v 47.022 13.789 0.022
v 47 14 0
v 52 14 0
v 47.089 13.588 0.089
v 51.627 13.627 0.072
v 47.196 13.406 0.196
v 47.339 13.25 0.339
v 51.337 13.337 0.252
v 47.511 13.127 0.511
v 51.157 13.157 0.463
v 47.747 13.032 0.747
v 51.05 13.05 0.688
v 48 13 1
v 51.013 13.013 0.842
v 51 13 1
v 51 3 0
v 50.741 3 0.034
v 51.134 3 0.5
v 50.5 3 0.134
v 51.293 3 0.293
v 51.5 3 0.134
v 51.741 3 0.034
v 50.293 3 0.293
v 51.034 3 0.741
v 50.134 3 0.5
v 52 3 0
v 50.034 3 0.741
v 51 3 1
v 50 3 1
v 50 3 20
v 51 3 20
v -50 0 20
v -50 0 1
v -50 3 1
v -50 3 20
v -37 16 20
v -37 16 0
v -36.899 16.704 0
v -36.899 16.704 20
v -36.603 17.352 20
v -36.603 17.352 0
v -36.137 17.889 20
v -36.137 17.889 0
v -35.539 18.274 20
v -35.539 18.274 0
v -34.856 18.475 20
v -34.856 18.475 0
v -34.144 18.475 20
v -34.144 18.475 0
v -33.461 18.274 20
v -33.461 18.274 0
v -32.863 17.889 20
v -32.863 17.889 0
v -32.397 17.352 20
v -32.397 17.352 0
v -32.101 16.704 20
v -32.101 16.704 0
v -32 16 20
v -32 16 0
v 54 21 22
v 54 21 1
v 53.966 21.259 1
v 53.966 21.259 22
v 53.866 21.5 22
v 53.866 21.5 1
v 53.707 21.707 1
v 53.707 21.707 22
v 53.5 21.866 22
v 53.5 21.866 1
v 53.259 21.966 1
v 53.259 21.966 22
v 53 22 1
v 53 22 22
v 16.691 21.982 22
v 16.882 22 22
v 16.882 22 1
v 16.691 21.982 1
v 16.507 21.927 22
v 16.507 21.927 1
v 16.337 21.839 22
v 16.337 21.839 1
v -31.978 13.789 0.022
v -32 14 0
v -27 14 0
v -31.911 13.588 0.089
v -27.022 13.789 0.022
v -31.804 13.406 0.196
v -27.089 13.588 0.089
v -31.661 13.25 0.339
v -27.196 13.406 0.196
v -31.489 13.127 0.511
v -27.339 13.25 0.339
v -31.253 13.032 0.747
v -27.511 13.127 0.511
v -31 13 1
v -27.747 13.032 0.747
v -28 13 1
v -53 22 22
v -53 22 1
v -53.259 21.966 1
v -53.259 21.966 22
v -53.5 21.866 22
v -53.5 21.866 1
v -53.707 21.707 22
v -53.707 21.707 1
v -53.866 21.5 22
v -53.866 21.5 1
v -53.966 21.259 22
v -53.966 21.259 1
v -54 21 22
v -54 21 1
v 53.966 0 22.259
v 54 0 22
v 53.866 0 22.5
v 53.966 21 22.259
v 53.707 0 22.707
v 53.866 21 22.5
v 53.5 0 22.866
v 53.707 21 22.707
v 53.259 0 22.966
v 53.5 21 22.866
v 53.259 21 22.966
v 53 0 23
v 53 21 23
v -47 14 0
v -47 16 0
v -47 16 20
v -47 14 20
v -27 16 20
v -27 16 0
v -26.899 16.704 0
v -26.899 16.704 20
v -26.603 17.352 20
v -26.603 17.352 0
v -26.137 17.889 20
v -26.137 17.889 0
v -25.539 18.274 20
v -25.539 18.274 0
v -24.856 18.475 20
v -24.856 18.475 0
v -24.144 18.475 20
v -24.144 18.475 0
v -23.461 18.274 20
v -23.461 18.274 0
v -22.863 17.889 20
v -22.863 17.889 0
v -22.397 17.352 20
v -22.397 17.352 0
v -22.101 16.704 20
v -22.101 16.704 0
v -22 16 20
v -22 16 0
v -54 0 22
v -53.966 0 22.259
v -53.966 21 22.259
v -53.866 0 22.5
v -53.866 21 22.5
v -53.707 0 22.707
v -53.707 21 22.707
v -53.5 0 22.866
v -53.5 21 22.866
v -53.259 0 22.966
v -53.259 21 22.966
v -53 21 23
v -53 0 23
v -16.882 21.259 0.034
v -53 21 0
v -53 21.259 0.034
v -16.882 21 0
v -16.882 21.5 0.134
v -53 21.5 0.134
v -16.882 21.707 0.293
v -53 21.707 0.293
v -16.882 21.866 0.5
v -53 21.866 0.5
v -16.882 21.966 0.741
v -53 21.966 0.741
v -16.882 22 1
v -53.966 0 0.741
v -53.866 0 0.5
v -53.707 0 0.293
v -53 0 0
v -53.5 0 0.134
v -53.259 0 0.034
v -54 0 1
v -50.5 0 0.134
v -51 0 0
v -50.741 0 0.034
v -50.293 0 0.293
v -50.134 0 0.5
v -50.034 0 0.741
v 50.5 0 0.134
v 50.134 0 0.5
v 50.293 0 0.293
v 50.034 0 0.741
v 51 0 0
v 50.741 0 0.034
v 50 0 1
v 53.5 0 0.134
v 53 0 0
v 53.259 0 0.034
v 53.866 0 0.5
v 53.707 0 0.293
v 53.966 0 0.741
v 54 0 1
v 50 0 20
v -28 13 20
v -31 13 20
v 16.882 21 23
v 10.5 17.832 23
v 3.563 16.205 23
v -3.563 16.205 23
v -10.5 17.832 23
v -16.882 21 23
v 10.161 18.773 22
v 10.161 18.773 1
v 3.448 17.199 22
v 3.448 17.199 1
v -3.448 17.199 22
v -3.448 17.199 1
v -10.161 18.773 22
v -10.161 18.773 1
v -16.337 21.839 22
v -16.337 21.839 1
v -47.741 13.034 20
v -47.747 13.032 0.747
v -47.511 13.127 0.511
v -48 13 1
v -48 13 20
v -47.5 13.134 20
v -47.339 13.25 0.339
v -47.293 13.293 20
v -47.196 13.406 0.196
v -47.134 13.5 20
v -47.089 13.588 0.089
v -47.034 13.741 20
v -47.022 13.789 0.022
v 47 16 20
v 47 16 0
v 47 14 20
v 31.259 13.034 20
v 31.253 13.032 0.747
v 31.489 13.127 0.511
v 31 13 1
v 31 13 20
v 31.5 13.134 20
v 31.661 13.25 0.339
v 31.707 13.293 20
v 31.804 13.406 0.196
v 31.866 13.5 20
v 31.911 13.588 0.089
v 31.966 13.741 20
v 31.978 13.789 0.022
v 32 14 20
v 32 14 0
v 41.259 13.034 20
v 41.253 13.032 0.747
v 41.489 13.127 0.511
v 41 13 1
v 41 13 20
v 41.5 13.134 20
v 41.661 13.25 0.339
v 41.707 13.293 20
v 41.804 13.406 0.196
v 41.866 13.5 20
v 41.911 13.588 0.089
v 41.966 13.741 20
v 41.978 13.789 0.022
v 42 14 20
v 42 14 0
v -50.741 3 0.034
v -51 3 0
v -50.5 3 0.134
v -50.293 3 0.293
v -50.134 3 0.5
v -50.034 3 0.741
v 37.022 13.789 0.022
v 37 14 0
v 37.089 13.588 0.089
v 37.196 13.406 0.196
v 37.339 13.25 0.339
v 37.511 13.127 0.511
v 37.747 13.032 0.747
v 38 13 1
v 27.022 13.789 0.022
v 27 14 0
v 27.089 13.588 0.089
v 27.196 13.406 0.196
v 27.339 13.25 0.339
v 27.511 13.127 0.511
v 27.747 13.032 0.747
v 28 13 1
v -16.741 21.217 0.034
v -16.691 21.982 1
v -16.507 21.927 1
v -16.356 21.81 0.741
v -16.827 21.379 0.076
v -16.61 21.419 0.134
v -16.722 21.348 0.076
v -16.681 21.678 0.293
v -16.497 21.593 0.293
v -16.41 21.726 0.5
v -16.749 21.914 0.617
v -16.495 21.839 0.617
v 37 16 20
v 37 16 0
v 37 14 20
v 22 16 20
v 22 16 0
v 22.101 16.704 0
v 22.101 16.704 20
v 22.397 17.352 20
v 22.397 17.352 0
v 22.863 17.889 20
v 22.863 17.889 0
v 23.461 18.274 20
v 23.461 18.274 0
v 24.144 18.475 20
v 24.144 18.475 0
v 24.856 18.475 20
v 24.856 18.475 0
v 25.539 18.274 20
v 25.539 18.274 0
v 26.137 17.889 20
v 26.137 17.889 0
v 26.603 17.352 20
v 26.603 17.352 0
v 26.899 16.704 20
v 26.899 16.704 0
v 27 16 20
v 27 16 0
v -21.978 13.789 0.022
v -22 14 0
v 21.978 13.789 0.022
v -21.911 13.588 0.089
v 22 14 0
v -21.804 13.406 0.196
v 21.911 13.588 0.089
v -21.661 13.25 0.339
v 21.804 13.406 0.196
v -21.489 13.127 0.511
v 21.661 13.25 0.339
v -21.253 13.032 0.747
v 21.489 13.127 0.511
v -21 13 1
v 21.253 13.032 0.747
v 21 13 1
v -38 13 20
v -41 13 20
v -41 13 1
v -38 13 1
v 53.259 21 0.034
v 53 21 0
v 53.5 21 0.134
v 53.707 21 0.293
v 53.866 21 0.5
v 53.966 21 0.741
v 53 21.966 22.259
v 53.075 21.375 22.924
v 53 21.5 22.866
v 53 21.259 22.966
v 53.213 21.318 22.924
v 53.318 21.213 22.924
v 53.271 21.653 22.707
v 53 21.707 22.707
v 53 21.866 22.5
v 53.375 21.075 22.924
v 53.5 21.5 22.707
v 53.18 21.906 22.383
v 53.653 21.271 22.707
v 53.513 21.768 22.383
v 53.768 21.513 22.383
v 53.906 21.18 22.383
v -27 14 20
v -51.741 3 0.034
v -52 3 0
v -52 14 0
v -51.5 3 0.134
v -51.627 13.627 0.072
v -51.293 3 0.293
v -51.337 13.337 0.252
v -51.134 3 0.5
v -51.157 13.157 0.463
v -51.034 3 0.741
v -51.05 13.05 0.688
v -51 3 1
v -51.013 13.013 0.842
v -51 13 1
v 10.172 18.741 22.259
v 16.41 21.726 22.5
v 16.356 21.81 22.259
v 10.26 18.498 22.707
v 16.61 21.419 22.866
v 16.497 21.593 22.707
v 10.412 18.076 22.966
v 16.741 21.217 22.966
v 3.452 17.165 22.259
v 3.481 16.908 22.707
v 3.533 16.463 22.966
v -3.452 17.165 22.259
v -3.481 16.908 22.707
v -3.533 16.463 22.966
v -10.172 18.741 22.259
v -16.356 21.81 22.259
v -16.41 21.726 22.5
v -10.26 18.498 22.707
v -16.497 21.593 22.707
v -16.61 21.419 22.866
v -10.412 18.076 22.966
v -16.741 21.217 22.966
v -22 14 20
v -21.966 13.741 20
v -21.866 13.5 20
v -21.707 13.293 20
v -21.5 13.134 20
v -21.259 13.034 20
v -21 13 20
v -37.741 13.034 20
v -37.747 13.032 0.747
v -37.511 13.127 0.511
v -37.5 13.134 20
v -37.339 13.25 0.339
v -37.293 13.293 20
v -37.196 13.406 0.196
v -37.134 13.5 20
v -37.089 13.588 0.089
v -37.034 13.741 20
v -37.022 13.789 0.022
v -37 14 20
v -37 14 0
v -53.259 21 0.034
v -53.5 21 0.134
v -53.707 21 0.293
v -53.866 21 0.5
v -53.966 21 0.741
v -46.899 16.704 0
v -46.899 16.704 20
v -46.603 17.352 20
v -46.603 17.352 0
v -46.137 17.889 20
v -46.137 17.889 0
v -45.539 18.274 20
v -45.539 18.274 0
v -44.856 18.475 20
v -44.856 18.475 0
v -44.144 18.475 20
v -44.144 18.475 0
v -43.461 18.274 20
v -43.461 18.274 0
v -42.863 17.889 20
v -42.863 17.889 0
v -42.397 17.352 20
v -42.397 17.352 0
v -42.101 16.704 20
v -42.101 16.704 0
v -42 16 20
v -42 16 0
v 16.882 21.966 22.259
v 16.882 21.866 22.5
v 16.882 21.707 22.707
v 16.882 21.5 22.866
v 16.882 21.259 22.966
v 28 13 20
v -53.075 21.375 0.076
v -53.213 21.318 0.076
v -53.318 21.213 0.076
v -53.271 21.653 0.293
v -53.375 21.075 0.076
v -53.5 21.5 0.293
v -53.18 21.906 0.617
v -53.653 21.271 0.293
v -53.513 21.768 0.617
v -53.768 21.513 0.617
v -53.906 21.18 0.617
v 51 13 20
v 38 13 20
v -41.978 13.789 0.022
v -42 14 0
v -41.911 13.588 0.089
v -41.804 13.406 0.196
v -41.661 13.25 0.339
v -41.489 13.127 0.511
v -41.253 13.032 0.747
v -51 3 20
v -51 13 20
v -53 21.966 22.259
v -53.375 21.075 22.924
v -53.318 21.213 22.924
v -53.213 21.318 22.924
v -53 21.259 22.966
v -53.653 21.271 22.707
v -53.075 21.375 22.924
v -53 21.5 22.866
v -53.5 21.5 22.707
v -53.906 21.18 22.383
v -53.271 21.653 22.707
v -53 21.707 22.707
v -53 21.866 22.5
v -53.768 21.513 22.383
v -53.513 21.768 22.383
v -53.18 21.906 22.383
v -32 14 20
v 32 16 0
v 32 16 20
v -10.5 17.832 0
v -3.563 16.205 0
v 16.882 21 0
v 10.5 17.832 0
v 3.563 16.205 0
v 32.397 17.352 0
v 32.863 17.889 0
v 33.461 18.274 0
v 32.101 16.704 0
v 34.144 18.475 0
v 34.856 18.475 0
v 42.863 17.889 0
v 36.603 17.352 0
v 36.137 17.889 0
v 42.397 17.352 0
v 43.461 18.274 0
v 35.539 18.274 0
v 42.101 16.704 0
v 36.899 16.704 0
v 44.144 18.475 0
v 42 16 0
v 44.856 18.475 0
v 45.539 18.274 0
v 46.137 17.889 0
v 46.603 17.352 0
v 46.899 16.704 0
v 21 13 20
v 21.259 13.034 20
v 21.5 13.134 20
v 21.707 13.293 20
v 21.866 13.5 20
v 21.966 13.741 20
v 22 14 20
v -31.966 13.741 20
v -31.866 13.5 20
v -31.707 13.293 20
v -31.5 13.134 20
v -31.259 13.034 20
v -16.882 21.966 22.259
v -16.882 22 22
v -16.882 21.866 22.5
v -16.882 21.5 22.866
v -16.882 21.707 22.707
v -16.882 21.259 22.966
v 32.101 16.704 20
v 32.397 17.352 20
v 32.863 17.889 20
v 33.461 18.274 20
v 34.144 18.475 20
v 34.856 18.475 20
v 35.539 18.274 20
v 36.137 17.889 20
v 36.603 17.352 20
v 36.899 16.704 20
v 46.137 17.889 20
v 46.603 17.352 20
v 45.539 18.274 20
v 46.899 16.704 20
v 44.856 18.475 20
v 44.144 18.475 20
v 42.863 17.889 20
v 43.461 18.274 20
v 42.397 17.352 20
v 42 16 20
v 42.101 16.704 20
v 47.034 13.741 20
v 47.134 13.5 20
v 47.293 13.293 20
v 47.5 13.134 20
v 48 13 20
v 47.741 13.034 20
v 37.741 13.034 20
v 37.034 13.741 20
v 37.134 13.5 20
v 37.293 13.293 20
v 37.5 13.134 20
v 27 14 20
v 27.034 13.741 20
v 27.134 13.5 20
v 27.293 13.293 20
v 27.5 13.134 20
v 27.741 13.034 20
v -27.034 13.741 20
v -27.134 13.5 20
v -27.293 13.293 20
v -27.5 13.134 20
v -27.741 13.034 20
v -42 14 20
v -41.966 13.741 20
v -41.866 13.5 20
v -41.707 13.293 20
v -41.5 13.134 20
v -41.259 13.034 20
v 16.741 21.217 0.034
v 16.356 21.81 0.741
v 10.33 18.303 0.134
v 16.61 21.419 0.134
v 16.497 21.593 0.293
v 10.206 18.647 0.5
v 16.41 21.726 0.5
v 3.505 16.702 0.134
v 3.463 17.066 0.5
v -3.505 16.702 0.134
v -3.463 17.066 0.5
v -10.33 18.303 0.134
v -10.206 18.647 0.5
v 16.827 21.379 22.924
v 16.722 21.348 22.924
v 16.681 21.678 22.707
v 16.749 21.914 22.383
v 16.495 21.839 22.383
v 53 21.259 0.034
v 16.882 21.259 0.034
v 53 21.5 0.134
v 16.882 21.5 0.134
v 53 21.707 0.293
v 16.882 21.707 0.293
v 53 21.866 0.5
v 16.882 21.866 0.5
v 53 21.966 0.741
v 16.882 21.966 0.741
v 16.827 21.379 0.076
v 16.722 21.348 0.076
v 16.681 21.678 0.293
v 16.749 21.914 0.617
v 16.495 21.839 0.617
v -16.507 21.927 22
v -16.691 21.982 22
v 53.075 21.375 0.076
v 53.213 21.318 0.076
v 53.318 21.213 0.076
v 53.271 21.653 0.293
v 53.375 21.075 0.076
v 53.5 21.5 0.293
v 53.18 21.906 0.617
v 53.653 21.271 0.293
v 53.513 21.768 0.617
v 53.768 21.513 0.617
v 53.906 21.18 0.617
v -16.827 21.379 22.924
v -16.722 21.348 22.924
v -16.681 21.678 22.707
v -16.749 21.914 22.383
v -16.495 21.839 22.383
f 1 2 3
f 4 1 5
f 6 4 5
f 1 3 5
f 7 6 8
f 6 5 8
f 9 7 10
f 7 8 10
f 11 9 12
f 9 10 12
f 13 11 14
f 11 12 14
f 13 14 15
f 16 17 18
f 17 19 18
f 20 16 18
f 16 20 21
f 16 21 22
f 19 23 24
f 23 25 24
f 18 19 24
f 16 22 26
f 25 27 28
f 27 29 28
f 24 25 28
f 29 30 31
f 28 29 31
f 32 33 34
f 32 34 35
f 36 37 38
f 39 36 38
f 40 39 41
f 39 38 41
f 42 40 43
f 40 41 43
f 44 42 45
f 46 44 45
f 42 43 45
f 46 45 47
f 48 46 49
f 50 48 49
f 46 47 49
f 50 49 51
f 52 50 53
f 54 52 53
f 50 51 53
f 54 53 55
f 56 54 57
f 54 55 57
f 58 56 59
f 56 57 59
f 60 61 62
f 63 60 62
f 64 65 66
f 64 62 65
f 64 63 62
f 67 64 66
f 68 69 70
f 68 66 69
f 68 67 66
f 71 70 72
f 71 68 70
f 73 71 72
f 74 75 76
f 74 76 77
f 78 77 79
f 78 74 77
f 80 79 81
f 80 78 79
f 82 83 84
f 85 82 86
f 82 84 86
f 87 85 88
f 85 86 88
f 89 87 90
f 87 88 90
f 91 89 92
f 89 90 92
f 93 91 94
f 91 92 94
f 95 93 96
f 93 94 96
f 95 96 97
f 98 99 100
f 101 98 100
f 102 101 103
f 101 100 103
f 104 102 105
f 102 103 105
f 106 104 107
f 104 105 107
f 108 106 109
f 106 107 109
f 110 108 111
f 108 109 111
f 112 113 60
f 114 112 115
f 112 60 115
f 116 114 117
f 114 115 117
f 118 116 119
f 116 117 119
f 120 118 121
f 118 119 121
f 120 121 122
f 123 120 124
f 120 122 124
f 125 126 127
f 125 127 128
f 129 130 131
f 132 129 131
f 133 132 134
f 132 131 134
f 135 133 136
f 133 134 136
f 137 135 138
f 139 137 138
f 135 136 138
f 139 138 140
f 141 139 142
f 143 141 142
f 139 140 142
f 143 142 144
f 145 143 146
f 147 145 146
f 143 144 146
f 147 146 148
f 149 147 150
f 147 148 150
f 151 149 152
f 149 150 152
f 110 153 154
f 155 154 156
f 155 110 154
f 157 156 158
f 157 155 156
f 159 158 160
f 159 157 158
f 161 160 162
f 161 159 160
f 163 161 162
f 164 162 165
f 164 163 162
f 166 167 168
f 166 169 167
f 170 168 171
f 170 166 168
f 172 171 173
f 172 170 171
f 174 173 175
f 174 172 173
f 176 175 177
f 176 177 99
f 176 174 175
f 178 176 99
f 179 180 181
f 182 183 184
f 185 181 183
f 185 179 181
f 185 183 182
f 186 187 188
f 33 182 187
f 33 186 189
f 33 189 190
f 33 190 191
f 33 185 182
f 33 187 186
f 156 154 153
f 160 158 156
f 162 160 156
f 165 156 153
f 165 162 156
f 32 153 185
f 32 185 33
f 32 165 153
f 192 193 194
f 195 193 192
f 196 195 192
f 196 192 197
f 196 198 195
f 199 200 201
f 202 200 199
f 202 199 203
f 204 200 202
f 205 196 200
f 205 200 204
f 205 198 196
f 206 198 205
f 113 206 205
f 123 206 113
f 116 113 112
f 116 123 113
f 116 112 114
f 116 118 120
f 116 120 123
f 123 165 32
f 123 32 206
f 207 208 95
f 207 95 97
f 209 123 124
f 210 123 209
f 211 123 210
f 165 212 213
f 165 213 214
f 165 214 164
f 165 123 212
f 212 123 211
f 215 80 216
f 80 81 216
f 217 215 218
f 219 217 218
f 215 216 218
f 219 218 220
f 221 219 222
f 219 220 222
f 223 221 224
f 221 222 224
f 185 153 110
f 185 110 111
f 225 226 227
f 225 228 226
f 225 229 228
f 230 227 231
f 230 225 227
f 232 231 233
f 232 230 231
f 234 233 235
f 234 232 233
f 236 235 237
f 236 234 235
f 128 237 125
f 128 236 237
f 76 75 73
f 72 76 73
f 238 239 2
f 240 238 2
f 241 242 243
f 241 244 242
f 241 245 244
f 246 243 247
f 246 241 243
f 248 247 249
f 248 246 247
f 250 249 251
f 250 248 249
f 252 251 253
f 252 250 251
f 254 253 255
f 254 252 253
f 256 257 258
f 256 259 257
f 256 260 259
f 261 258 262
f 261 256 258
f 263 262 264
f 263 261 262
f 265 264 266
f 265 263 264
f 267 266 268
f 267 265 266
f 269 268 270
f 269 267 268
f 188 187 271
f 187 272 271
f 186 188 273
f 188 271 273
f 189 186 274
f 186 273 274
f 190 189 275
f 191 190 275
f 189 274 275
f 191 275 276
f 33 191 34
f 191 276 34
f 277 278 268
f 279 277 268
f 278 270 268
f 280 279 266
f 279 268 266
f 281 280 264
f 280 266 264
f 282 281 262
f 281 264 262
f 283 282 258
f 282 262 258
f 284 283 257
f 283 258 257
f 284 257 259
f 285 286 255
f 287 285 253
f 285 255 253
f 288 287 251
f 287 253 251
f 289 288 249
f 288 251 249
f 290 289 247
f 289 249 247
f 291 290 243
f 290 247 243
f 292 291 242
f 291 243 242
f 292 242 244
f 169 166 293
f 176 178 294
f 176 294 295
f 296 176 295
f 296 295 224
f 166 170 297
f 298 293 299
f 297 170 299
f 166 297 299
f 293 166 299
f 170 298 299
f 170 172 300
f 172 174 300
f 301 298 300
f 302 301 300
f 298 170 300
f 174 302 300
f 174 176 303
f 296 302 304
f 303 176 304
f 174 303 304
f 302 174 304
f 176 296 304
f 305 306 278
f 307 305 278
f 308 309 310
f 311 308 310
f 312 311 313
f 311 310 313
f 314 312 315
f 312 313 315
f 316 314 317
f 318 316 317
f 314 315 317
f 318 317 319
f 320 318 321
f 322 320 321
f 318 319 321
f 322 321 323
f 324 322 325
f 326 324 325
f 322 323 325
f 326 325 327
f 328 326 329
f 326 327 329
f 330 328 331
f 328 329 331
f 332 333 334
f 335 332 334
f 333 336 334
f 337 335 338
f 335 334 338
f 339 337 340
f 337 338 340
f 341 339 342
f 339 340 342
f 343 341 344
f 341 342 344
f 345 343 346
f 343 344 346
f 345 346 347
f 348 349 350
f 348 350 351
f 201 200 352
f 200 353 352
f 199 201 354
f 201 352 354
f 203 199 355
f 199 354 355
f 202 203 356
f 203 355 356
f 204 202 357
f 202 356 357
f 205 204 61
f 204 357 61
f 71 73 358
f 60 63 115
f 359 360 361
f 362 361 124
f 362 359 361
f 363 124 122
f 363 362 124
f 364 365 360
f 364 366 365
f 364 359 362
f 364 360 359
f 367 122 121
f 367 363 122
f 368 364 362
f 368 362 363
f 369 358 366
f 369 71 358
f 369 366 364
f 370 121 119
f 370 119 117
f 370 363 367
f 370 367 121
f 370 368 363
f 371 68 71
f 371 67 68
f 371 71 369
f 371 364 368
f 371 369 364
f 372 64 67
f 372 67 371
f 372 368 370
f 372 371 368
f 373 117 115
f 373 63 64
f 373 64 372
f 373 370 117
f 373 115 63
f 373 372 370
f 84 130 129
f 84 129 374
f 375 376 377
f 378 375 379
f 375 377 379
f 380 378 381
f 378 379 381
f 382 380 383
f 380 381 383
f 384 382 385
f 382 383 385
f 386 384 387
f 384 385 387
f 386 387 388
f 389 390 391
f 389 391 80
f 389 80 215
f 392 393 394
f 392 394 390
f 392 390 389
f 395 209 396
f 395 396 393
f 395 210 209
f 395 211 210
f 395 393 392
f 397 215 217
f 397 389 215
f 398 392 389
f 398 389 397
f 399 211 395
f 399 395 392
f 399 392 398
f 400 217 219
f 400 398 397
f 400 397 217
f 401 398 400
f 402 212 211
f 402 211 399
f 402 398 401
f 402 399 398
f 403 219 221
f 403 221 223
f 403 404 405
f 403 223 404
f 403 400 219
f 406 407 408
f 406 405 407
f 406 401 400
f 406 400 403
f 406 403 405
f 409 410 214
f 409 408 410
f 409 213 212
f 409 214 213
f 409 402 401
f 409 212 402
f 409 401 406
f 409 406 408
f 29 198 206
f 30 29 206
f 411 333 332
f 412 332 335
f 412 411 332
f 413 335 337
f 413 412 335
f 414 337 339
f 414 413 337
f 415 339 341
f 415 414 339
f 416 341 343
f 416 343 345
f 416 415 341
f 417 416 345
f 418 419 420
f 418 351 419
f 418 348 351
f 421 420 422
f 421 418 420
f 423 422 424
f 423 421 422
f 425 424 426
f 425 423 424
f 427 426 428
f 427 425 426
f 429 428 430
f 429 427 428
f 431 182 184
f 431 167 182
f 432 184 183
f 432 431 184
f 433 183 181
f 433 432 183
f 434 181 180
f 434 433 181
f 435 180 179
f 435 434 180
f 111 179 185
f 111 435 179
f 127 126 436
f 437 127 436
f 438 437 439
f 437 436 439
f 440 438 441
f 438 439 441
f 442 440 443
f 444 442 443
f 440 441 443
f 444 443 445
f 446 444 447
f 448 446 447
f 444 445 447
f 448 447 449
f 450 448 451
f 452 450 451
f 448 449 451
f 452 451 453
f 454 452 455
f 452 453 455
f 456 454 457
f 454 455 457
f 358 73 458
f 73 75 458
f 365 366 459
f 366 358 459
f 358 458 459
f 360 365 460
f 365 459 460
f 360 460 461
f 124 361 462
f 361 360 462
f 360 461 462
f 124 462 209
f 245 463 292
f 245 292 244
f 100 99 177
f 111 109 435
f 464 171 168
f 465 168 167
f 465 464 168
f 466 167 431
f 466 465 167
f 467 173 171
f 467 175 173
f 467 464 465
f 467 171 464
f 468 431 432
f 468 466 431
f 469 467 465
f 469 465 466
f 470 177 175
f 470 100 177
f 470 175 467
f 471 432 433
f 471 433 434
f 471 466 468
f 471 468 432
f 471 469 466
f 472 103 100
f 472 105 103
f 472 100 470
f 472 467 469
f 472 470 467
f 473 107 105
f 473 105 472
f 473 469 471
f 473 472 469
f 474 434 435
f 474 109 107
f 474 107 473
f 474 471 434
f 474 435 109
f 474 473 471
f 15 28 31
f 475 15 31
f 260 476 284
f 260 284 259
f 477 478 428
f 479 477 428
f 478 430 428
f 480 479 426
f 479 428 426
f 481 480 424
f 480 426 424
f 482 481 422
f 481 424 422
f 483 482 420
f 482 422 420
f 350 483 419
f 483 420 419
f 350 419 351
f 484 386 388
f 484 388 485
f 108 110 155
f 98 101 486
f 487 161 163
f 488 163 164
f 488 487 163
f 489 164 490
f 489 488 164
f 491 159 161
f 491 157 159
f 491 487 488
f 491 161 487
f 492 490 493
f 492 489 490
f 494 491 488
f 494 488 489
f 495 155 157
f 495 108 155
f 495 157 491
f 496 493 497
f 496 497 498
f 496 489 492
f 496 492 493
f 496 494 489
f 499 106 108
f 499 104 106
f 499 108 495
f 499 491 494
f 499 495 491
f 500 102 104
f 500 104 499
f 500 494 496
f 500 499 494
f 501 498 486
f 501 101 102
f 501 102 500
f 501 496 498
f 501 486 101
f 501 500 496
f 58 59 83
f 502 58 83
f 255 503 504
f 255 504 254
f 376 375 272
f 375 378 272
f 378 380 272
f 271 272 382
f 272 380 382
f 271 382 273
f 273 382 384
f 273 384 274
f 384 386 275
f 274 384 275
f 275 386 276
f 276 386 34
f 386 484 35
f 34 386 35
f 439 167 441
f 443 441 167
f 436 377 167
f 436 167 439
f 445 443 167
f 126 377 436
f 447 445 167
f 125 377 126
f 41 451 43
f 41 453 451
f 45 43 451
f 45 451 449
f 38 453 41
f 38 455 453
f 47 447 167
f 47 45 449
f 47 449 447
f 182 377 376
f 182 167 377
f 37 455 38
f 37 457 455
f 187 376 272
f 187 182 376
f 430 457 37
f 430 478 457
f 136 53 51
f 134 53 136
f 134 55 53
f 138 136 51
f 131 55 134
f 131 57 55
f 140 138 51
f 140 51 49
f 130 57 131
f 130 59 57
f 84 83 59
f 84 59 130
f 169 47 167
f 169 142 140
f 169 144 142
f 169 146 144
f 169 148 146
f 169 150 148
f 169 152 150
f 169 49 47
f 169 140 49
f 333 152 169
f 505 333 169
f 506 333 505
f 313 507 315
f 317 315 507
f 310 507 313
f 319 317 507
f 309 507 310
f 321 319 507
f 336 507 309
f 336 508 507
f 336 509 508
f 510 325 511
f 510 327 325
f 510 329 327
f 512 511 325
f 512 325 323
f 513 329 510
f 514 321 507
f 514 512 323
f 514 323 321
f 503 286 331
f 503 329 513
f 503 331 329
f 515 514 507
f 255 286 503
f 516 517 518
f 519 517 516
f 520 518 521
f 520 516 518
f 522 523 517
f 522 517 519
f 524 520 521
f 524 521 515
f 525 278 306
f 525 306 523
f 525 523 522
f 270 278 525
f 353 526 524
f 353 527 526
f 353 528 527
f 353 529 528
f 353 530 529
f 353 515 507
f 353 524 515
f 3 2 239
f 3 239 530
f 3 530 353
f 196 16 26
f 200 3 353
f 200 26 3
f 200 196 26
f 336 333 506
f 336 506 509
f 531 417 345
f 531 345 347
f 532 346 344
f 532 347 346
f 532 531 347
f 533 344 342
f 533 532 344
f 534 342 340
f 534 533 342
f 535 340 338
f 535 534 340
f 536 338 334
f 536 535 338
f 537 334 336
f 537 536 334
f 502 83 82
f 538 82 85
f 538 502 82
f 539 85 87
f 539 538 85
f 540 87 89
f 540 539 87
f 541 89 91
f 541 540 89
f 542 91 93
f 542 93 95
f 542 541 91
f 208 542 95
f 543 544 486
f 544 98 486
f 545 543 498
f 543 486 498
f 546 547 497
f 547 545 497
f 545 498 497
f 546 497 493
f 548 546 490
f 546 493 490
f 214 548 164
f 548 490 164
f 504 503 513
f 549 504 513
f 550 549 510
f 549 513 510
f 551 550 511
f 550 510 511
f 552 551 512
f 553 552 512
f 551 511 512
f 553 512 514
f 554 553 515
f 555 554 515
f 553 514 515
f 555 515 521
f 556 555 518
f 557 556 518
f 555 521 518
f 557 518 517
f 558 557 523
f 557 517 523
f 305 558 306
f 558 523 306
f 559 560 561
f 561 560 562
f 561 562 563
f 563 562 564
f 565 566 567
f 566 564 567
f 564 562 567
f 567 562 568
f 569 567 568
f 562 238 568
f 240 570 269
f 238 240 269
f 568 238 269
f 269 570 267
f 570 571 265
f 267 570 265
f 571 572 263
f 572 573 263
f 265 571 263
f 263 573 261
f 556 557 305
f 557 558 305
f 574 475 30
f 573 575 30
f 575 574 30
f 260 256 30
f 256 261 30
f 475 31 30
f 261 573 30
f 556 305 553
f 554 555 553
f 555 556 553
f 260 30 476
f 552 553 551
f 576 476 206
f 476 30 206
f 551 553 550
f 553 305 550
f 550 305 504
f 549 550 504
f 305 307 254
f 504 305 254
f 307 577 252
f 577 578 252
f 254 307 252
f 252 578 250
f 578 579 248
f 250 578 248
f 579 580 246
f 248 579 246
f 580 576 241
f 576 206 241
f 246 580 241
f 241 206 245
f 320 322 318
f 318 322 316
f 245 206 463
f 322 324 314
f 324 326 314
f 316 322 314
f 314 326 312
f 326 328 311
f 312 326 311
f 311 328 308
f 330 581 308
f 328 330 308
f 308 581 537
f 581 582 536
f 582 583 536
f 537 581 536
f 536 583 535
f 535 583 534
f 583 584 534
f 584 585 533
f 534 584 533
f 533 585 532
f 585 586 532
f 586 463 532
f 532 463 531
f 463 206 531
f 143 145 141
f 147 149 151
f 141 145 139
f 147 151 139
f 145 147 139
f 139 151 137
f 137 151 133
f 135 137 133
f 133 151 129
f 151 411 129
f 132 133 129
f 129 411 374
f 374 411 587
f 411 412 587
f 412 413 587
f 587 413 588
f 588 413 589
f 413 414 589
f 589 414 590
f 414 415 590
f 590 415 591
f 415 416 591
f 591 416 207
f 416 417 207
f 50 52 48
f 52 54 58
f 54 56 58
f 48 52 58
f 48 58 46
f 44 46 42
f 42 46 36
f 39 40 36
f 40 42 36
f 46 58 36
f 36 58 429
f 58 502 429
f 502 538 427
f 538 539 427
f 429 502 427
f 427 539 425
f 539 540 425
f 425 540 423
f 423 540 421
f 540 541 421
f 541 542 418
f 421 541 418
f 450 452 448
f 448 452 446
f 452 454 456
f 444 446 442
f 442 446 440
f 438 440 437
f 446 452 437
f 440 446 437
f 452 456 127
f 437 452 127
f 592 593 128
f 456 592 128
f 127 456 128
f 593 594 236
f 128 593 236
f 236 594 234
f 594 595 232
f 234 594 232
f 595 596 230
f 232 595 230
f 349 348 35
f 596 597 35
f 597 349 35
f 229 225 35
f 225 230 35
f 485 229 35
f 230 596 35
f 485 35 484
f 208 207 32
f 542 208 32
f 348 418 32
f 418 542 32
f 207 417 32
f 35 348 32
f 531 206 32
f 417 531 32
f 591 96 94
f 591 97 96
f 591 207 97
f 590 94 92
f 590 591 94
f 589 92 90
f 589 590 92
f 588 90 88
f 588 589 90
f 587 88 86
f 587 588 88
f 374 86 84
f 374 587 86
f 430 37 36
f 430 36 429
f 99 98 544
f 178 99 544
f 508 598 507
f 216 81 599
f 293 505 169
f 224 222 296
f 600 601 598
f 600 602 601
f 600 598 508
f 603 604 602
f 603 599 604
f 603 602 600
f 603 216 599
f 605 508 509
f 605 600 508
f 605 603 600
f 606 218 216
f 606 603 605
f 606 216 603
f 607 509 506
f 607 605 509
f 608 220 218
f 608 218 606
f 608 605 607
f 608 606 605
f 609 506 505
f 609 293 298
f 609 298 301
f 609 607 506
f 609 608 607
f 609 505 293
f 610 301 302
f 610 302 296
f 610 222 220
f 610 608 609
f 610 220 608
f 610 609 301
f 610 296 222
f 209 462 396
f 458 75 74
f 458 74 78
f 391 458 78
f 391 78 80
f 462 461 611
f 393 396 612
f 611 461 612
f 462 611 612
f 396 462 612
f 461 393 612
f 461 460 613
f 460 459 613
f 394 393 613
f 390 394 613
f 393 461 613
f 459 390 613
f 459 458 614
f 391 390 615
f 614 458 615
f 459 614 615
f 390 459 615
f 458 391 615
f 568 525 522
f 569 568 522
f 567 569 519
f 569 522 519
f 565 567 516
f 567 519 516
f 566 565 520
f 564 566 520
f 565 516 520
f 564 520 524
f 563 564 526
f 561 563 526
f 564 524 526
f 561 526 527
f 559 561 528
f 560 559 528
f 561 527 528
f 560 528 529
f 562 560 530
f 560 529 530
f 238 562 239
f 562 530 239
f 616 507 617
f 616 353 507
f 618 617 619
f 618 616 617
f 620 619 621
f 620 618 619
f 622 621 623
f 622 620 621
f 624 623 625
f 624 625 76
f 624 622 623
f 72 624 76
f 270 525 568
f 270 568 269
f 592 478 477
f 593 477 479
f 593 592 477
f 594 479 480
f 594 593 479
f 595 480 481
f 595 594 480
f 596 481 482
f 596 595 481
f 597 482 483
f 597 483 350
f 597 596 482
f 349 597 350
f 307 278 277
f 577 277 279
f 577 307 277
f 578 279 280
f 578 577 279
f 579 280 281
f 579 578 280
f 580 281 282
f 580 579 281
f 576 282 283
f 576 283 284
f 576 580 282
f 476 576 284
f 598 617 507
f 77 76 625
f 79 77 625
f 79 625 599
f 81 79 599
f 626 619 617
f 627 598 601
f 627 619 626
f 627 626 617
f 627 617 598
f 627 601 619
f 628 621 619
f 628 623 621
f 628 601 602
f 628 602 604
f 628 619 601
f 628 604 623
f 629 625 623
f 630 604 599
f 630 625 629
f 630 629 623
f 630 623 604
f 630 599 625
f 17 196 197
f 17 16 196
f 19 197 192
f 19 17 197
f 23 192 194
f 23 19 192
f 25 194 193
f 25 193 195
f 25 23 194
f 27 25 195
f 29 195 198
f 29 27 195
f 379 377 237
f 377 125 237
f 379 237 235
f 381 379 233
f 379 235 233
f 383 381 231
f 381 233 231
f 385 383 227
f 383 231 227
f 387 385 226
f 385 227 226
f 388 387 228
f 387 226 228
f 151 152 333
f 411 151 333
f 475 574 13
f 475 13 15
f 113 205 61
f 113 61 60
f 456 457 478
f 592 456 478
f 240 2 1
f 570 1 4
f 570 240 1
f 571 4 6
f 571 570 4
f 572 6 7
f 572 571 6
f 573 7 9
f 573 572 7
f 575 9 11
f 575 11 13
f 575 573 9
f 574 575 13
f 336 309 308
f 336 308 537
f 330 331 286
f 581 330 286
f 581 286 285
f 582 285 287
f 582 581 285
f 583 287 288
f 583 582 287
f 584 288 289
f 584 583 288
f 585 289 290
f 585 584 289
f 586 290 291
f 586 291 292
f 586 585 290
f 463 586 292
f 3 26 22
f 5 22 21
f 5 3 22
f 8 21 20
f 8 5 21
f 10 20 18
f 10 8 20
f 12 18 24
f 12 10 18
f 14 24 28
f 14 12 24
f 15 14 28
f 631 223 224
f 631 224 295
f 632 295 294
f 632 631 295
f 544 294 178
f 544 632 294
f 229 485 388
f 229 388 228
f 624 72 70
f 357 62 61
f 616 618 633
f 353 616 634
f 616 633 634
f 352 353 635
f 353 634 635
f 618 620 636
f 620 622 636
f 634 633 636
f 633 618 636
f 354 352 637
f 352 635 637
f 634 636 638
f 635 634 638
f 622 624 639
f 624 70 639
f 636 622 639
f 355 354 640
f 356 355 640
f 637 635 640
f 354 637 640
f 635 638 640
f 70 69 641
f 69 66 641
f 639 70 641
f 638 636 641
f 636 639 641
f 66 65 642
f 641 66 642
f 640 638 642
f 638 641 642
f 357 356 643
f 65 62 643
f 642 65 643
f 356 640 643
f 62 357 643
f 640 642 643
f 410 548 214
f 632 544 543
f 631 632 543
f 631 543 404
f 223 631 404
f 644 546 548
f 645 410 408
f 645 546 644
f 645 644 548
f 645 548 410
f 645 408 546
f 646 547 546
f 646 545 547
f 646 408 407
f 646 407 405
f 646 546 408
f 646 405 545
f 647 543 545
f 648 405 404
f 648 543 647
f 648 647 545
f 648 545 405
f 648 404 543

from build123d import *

# Parameters (mm, degrees)
F0_W     = 1
F0_H     = 20
F0_W_2   = 100
F1_DEPTH = 22
F2_DEPTH = 13
F3_DEPTH = 3
F5_DEPTH = 23
F4_W     = 5
F4_H     = 3
F6_DEPTH = 20
F7_R     = 0.9999


# Not quite as in the source:
# - a fillet or chamfer is up to 0.001 mm smaller than in the source, because OpenCascade refuses the exact size
# - a feature names something its author has since deleted; it is built from what else it names


with BuildPart() as f1:
    # F0 (on Front) → F1 (new body)
    with BuildSketch(Plane.XZ):
        Polygon((51, 20), (51, 0), (54, 0), (54, 23), (-54, 23), (-54, 0), (-51, 0), (-51, 20), (-50, 20), (50, 20), align=None)
        with Locations((-50.5, 10)):
            Rectangle(F0_W, F0_H)
        with Locations((0, 10)):
            Rectangle(F0_W_2, F0_H)
        with Locations((50.5, 10)):
            Rectangle(F0_W, F0_H)
    extrude(amount=-F1_DEPTH)

    # F0 (on Front) → F2 (cut)
    with BuildSketch(Plane.XZ):
        with Locations((-50.5, 10)):
            Rectangle(F0_W, F0_H)
        with Locations((0, 10)):
            Rectangle(F0_W_2, F0_H)
        with Locations((50.5, 10)):
            Rectangle(F0_W, F0_H)
    extrude(amount=-F2_DEPTH, mode=Mode.SUBTRACT)

    # F0 (on Front) → F3 (join)
    with BuildSketch(Plane.XZ):
        with Locations((-50.5, 10)):
            Rectangle(F0_W, F0_H)
        with Locations((50.5, 10)):
            Rectangle(F0_W, F0_H)
    extrude(amount=-F3_DEPTH)

    # F4 (on face) → F5 (cut, through all)
    with BuildSketch(Plane(origin=(0, 0, 0), x_dir=(1, 0, 0), z_dir=(0, 0, -1))):
        with BuildLine():
            Line((-16.5831239518, -22), (16.5831239518, -22))
            ThreePointArc((16.5831239518, -22), (0, -17), (-16.5831239518, -22))
        make_face()
    extrude(amount=-F5_DEPTH, mode=Mode.SUBTRACT)

    # F4 (on face) → F6 (cut, through all)
    with BuildSketch(Plane(origin=(0, 0, 0), x_dir=(1, 0, 0), z_dir=(0, 0, -1))):
        with Locations((-44.5, -14.5)):
            Rectangle(F4_W, F4_H)
        with Locations((-34.5, -14.5)):
            Rectangle(F4_W, F4_H)
        with Locations((-24.5, -14.5)):
            Rectangle(F4_W, F4_H)
        with Locations((24.5, -14.5)):
            Rectangle(F4_W, F4_H)
        with Locations((34.5, -14.5)):
            Rectangle(F4_W, F4_H)
        with Locations((44.5, -14.5)):
            Rectangle(F4_W, F4_H)
        with BuildLine():
            Line((-42, -16), (-47, -16))
            ThreePointArc((-47, -16), (-44.5, -18.5), (-42, -16))
        make_face()
        with BuildLine():
            Line((-32, -16), (-37, -16))
            ThreePointArc((-37, -16), (-34.5, -18.5), (-32, -16))
        make_face()
        with BuildLine():
            Line((-22, -16), (-27, -16))
            ThreePointArc((-27, -16), (-24.5, -18.5), (-22, -16))
        make_face()
        with BuildLine():
            ThreePointArc((22, -16), (24.5, -18.5), (27, -16))
            Line((27, -16), (22, -16))
        make_face()
        with BuildLine():
            ThreePointArc((32, -16), (34.5, -18.5), (37, -16))
            Line((37, -16), (32, -16))
        make_face()
        with BuildLine():
            ThreePointArc((42, -16), (44.5, -18.5), (47, -16))
            Line((47, -16), (42, -16))
        make_face()
    extrude(amount=-F6_DEPTH, mode=Mode.SUBTRACT)

    # F7 (radius 1 in the source; OpenCascade refuses exactly that, so slightly less here)
    f7_edges = [f1.edges().sort_by_distance(p)[0] for p in [
        (-54, 22, 11.5),
        (54, 22, 11.5),
        (35.291562, 22, 0),
        (-35.291562, 22, 0),
        (54, 11, 0),
        (-54, 11, 0),
        (-54, 11, 23),
        (-35.291562, 22, 23),
        (35.291562, 22, 23),
        (54, 11, 23),
        (-49, 13, 0),
        (-39.5, 13, 0),
        (-29.5, 13, 0),
        (0, 13, 0),
        (29.5, 13, 0),
        (39.5, 13, 0),
        (49, 13, 0),
        (51, 8, 0),
        (-51, 8, 0),
        (-50, 1.5, 0),
        (50, 1.5, 0),
        (0, 17, 23),
        (0, 17, 0),
        (-47, 13, 10),
        (-42, 13, 10),
        (-37, 13, 10),
        (-32, 13, 10),
        (-27, 13, 10),
        (-22, 13, 10),
        (22, 13, 10),
        (27, 13, 10),
        (32, 13, 10),
        (47, 13, 10),
        (42, 13, 10),
        (37, 13, 10),
        (16.583124, 22, 11.5),
        (-16.583124, 22, 11.5),
    ]]
    fillet(f7_edges, radius=F7_R)


solid = f1.part
